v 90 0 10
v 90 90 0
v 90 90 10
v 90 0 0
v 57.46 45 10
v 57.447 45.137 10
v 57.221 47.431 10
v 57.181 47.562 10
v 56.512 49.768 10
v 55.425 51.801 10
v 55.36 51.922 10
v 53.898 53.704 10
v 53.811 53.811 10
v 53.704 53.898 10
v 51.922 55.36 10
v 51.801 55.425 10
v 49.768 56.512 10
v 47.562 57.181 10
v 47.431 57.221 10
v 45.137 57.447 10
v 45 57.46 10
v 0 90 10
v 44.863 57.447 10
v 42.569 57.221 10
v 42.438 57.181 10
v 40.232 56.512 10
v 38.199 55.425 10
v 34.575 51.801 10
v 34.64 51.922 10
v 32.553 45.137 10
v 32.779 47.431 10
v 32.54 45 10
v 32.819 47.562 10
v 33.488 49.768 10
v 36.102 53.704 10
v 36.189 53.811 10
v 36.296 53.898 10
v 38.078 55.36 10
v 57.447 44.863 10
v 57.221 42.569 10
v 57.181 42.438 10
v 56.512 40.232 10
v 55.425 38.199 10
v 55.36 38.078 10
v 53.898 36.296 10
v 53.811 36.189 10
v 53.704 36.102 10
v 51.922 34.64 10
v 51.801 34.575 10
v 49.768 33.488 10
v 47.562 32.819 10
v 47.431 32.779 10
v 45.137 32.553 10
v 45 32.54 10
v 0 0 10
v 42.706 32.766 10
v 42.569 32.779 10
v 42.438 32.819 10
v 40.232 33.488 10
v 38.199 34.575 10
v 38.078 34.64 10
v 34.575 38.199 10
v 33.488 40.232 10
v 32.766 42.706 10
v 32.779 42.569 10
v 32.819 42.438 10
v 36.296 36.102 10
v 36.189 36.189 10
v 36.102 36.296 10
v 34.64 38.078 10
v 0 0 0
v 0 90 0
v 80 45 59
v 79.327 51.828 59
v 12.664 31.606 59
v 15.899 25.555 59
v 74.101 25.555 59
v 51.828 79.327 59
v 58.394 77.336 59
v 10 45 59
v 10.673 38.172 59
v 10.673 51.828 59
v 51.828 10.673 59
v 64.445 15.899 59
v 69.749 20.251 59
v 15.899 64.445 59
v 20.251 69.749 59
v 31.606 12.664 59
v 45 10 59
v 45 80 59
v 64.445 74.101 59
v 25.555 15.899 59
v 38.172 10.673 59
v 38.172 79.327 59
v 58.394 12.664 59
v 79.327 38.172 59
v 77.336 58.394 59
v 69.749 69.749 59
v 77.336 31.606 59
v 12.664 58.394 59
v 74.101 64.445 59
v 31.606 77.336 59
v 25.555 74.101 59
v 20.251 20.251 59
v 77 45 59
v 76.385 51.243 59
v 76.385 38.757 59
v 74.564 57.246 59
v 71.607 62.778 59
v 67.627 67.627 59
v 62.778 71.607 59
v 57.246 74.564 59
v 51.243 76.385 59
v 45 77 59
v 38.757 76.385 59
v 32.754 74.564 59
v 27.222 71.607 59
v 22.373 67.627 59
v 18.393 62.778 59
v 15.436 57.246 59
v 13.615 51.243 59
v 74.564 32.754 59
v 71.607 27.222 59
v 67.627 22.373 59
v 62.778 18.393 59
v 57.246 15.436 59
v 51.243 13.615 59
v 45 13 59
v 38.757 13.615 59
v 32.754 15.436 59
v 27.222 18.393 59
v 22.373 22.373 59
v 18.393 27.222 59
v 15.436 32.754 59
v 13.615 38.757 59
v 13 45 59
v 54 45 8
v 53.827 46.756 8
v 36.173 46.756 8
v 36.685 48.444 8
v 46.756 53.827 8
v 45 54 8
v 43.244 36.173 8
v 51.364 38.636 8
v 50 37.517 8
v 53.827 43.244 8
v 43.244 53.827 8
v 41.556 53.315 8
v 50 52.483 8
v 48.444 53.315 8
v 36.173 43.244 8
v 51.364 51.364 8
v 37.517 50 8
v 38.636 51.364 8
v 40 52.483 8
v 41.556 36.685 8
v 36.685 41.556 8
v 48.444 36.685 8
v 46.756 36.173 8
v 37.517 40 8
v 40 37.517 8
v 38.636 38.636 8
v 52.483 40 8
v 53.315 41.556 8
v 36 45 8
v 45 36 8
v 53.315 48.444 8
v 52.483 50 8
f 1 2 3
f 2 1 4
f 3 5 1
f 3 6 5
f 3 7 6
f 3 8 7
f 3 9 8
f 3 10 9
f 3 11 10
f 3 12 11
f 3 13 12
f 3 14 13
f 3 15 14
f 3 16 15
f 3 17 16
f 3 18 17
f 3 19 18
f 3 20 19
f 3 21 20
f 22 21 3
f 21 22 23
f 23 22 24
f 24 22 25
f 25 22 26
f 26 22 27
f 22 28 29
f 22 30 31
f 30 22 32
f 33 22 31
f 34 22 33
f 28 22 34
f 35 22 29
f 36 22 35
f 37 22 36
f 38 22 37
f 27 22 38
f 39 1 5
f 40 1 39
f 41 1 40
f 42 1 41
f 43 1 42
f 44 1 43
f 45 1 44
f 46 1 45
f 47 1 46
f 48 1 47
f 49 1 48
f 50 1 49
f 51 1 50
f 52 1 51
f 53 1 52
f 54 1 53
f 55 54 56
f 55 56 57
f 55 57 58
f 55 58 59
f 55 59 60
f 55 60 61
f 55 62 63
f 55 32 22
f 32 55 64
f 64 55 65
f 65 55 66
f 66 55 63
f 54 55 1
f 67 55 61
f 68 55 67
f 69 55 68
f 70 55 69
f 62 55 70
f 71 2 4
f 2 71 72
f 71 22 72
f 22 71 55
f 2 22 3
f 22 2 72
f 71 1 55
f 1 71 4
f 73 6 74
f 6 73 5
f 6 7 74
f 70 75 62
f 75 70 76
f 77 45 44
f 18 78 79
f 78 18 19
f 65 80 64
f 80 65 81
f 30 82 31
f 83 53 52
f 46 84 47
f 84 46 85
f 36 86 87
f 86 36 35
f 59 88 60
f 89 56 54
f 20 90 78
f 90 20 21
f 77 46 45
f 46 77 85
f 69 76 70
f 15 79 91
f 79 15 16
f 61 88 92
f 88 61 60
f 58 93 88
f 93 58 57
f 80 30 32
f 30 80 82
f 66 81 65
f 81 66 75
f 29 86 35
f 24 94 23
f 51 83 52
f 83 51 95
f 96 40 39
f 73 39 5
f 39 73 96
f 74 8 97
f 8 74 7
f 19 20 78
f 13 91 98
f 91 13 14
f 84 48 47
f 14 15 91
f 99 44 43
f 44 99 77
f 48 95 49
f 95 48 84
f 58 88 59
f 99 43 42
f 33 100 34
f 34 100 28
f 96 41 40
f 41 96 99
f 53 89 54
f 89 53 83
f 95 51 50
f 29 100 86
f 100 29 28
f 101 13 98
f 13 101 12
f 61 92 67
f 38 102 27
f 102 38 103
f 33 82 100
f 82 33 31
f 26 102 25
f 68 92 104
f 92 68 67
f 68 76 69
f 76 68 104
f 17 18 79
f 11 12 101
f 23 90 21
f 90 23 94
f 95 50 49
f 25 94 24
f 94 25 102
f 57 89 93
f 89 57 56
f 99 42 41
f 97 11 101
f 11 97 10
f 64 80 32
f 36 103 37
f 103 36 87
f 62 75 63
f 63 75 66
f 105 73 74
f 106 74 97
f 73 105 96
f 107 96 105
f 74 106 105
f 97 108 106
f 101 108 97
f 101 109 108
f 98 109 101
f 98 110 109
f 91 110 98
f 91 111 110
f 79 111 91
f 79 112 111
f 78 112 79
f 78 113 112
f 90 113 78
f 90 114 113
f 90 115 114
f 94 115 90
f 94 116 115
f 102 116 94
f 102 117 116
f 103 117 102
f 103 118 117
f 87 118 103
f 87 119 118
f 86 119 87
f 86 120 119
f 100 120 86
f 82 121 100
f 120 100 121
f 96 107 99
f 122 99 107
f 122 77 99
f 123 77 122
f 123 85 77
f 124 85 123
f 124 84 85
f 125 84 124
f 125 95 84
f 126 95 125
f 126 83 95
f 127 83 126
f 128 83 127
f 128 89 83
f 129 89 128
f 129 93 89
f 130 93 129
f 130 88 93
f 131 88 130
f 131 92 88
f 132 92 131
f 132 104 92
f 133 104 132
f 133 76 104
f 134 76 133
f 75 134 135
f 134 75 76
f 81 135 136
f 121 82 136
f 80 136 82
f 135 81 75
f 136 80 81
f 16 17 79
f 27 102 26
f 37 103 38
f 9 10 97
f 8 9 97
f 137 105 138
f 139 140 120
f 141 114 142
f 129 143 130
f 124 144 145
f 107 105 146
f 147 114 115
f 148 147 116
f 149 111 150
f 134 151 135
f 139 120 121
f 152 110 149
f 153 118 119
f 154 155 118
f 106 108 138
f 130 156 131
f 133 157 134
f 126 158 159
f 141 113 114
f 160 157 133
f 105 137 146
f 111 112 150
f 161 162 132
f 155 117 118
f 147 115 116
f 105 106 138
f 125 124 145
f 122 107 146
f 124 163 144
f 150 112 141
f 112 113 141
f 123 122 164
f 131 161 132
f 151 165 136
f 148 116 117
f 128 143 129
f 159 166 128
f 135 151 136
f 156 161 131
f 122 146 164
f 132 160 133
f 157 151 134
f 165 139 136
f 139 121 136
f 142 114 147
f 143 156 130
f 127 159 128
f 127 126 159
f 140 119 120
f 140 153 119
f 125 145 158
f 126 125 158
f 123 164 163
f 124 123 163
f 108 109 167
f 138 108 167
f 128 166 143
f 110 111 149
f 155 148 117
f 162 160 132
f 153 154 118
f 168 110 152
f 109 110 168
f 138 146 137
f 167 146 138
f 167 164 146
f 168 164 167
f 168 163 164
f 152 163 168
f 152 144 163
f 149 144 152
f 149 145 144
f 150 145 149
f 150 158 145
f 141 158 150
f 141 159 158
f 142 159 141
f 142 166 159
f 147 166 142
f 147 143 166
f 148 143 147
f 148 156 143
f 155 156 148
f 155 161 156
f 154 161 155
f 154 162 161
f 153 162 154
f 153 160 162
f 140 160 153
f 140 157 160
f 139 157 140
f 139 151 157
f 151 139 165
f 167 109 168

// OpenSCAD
$fn = 32;

// ----------------------------------------------------------------------
// Hopper: funnel with square flange
// ----------------------------------------------------------------------

// --- parameters (mm) ---
fl = 90;                  // flange side, X and Y
fl_t = 10;                // flange thickness
cone_h = 50;              // cone height above the flange
top_d = 70;               // cone mouth diameter
bot_d = 24;               // cone spout diameter
wall = 3;                 // cone wall thickness

bore_d = bot_d - 2 * wall;  // spout bore diameter
total_h = fl_t + cone_h - 1;  // overall height

difference() {
  union() {
    cube([fl, fl, fl_t]);
    translate([fl / 2, fl / 2, fl_t - 1])
      cylinder(h = cone_h, d1 = bot_d, d2 = top_d);
  }
  translate([fl / 2, fl / 2, fl_t - 2])
    cylinder(h = cone_h + 1, d1 = bore_d, d2 = top_d - 2 * wall);
}
